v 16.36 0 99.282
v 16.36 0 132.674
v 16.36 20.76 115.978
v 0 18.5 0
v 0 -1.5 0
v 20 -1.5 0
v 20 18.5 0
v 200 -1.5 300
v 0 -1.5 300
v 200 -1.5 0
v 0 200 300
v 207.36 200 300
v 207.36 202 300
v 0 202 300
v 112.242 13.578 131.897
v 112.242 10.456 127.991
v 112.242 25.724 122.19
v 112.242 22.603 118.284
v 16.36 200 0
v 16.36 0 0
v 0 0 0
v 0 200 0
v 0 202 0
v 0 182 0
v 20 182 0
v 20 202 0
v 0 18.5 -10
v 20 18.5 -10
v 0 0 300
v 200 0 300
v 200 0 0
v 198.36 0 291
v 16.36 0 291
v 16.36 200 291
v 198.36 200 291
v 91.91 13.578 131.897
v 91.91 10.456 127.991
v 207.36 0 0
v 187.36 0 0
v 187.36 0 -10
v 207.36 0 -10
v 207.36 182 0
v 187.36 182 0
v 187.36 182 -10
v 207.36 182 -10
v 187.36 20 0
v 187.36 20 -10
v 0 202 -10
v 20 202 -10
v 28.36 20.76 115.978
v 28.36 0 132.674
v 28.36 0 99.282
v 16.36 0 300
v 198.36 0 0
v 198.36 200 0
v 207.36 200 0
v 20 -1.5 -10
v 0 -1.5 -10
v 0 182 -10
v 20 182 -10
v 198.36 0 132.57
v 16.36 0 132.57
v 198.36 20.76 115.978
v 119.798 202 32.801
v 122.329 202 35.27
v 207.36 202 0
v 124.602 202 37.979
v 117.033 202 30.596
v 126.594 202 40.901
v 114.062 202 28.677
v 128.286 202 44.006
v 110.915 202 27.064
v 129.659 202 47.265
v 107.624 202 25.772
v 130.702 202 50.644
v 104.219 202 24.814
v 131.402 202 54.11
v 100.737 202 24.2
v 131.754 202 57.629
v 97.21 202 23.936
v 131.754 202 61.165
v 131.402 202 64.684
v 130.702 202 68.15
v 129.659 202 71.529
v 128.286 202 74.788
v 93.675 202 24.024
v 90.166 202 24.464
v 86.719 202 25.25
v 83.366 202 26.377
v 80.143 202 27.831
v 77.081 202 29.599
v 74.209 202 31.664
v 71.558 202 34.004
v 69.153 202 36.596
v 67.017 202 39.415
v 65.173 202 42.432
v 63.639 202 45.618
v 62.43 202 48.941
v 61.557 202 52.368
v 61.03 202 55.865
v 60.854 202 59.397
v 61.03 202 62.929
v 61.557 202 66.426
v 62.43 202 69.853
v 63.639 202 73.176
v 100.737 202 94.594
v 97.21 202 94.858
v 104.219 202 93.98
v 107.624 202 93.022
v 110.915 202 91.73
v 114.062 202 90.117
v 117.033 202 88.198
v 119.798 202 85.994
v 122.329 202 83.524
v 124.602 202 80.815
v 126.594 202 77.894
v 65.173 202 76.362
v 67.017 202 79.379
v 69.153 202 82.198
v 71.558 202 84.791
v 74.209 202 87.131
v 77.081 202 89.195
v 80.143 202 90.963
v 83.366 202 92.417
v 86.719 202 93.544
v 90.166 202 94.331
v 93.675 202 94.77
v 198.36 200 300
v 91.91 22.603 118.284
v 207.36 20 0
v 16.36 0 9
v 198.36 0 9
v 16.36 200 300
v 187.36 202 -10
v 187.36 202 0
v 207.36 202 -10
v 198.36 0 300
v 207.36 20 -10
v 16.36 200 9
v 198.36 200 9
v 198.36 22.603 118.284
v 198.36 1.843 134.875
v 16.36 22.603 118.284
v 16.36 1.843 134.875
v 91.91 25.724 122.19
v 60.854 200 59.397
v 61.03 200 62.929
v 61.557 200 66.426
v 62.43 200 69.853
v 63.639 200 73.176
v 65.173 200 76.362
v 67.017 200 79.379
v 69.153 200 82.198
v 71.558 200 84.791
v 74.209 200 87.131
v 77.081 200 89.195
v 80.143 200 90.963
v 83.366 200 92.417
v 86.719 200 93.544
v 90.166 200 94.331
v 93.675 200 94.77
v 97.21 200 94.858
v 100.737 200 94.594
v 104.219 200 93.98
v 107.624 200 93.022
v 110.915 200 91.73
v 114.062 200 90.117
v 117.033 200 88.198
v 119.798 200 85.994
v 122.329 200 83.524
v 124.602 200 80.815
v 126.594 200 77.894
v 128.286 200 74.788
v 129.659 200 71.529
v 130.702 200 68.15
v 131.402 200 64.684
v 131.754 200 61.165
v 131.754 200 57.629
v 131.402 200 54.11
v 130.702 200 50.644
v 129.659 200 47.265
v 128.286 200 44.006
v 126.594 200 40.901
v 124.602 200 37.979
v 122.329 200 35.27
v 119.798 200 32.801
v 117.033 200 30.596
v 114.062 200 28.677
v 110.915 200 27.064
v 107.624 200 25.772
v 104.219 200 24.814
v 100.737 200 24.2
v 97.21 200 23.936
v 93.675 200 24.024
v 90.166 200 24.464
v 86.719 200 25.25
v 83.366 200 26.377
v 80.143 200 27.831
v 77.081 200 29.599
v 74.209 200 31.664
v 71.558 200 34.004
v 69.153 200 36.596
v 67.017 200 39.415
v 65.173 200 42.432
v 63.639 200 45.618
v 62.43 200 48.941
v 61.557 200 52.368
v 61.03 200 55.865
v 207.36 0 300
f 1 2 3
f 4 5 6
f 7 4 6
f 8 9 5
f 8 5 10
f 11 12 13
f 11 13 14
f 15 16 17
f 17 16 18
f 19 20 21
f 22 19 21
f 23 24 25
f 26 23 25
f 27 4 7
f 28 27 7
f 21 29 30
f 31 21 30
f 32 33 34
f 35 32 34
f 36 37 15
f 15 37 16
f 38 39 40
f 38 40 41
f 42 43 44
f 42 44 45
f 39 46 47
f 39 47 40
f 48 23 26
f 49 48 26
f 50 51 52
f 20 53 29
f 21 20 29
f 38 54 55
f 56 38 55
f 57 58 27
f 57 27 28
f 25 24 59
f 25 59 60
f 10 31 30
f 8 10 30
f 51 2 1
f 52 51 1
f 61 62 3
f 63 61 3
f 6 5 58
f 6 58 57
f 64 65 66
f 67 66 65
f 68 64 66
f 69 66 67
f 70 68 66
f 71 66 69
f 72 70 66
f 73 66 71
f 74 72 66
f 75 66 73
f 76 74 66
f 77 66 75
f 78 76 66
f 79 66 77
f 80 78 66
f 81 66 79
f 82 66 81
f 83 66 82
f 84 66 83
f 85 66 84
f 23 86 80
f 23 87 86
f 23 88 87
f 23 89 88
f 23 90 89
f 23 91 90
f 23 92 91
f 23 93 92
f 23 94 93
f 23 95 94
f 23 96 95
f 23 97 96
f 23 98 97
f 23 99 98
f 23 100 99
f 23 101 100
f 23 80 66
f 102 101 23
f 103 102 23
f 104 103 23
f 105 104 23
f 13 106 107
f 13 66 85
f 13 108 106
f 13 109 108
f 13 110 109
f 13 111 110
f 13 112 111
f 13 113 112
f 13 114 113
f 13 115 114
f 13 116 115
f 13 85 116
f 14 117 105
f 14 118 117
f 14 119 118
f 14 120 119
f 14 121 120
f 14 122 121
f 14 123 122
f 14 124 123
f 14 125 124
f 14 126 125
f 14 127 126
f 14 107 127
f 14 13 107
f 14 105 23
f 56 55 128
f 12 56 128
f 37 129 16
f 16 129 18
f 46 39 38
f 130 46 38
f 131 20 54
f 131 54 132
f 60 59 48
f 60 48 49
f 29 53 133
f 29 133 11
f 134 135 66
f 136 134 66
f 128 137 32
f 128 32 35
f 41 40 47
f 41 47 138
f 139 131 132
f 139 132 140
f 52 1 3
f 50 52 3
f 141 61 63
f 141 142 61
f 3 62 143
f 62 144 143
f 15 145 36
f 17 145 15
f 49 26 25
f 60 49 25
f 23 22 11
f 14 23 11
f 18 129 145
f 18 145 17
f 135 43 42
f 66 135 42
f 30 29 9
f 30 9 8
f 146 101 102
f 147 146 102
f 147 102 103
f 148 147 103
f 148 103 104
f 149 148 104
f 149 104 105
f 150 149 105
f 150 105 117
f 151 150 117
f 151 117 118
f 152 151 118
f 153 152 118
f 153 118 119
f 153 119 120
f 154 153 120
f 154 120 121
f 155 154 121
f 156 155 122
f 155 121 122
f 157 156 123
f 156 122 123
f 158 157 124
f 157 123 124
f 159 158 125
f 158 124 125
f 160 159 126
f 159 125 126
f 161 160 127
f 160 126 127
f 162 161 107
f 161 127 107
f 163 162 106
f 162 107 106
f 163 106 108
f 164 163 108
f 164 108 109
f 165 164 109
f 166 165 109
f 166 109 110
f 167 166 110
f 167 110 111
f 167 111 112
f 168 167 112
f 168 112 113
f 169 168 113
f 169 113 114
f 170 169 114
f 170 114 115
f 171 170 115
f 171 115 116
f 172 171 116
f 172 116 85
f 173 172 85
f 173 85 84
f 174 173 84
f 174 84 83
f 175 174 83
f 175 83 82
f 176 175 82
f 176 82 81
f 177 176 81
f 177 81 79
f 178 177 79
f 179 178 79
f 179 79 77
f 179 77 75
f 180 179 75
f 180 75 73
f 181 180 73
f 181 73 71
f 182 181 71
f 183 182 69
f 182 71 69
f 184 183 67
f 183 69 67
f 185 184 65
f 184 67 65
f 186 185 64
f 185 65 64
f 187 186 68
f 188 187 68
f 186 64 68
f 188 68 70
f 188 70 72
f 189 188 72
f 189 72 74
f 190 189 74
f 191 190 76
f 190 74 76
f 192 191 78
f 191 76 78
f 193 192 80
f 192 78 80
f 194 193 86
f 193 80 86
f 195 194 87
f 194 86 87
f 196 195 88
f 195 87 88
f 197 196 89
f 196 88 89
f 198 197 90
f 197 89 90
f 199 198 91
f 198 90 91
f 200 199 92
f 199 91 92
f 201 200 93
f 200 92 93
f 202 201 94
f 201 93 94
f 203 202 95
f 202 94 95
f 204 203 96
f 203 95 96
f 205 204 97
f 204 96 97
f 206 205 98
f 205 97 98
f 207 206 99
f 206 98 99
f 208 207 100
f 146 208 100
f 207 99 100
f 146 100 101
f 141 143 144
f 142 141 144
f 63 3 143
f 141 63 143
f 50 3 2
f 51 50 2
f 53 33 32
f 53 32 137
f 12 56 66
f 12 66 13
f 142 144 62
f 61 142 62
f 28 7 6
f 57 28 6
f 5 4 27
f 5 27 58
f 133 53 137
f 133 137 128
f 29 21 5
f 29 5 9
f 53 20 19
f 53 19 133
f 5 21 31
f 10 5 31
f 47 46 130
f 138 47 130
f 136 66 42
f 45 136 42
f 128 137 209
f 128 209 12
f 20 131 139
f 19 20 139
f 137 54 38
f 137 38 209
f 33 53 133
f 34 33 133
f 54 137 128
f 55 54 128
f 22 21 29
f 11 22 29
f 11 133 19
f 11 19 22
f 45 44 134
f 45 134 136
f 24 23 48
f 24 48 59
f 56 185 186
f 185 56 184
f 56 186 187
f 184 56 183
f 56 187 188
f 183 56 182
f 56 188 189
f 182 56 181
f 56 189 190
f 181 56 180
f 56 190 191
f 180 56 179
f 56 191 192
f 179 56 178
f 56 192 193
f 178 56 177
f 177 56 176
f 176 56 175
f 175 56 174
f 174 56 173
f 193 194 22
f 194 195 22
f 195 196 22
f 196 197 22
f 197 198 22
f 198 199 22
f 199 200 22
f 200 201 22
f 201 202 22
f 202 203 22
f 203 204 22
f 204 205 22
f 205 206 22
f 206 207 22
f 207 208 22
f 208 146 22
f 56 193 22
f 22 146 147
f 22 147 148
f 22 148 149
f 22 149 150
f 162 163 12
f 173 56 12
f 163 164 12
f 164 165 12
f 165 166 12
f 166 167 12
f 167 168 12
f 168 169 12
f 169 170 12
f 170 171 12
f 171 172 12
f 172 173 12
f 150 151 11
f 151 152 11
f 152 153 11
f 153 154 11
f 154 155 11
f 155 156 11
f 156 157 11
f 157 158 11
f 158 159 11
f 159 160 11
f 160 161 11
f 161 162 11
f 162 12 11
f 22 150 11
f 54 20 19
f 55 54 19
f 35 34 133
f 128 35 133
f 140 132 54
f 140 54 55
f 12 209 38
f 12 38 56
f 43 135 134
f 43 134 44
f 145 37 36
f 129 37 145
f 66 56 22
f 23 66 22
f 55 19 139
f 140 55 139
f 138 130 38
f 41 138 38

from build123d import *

# Parameters (mm, degrees)
F0_W      = 200
F0_H      = 300
F1_DEPTH  = 1.5
F2_W      = 16.3604896516
F2_H      = 300
F3_DEPTH  = 200
F5_DEPTH  = 12
F7_DEPTH  = 182
F8_W      = 20.3324407339
F8_H      = 15.5486247241
F9_DEPTH  = 5
F10_W     = 200
F10_H     = 9
F11_DEPTH = 182
F12_W     = 200
F12_H     = 9
F13_DEPTH = 182
F14_W     = 200
F14_H     = 300
F15_DEPTH = 9
F16_W     = 207.3604896516
F16_H     = 300
F17_DEPTH = 2
F18_R     = 35.4724219955
F19_DEPTH = 3
F20_W     = 20
F20_H     = 20
F21_DEPTH = 10
F22_W     = 20
F22_H     = 20
F23_DEPTH = 10
F24_W     = 20
F24_H     = 20
F25_DEPTH = 10
F26_W     = 20
F26_H     = 20
F27_DEPTH = 10


with BuildPart() as f1:
    # F0 (on Front) → F1 (new body)
    with BuildSketch(Plane.XZ):
        with Locations((100, 150)):
            Rectangle(F0_W, F0_H)
    extrude(amount=F1_DEPTH)


with BuildPart() as f3:
    # F2 (on face) → F3 (new body)
    with BuildSketch(Plane(origin=(0, 0, 0), x_dir=(-1, 0, 0), z_dir=(0, 1, 0))):
        with Locations((-8.1802448258, 150)):
            Rectangle(F2_W, F2_H)
    extrude(amount=F3_DEPTH)


with BuildPart() as f5:
    # F4 (on face) → F5 (new body)
    with BuildSketch(Plane.YZ.offset(16.3604896516)):
        Polygon((20.75971663, 115.9783601761), (0, 132.6744705439), (0, 99.2822498083), align=None)
    extrude(amount=F5_DEPTH)


with BuildPart() as f7:
    # F6 (on face) → F7 (new body)
    with BuildSketch(Plane.YZ.offset(16.3604896516)):
        Polygon((0, 132.5696110725), (20.75971663, 115.9783601761), (22.6025279975, 118.2841683415), (1.8428113675, 134.875419238), align=None)
    extrude(amount=F7_DEPTH)


with BuildPart() as f9:
    # F8 (on face) → F9 (new body)
    with BuildSketch(Plane(origin=(0, 66.4967558928, 83.2037209107), x_dir=(1, 0, 0), z_dir=(0, 0.6243158731, 0.7811719981))):
        with Locations((102.0758375525, -63.964534238)):
            Rectangle(F8_W, F8_H)
    extrude(amount=F9_DEPTH)


with BuildPart() as f11:
    # F10 (on face) → F11 (new body)
    with BuildSketch(Plane.YZ.offset(16.3604896516)):
        with Locations((100, 295.5)):
            Rectangle(F10_W, F10_H)
    extrude(amount=F11_DEPTH)


with BuildPart() as f13:
    # F12 (on face) → F13 (new body)
    with BuildSketch(Plane.YZ.offset(16.3604896516)):
        with Locations((100, 4.5)):
            Rectangle(F12_W, F12_H)
    extrude(amount=F13_DEPTH)


with BuildPart() as f15:
    # F14 (on face) → F15 (new body)
    with BuildSketch(Plane.YZ.offset(198.3604896516)):
        with Locations((100, 150)):
            Rectangle(F14_W, F14_H)
    extrude(amount=F15_DEPTH)


with BuildPart() as f17:
    # F16 (on face) → F17 (new body)
    with BuildSketch(Plane(origin=(0, 200, 0), x_dir=(-1, 0, 0), z_dir=(0, 1, 0))):
        with Locations((-103.6802448258, 150)):
            Rectangle(F16_W, F16_H)
    extrude(amount=F17_DEPTH)

    # F18 (on face) → F19 (cut)
    with BuildSketch(Plane(origin=(0, 202, 0), x_dir=(-1, 0, 0), z_dir=(0, 1, 0))):
        with Locations((-96.3260084391, 59.3970827758)):
            Circle(F18_R)
    extrude(amount=-F19_DEPTH, mode=Mode.SUBTRACT)


with BuildPart() as f21:
    # F20 (on face) → F21 (new body)
    with BuildSketch(Plane(origin=(0, 0, 0), x_dir=(1, 0, 0), z_dir=(0, 0, -1))):
        with Locations((10, -8.5)):
            Rectangle(F20_W, F20_H)
    extrude(amount=F21_DEPTH)


with BuildPart() as f23:
    # F22 (on face) → F23 (new body)
    with BuildSketch(Plane(origin=(0, 0, 0), x_dir=(1, 0, 0), z_dir=(0, 0, -1))):
        with Locations((197.3604896516, -10)):
            Rectangle(F22_W, F22_H)
    extrude(amount=F23_DEPTH)


with BuildPart() as f25:
    # F24 (on face) → F25 (new body)
    with BuildSketch(Plane(origin=(0, 0, 0), x_dir=(1, 0, 0), z_dir=(0, 0, -1))):
        with Locations((10, -192)):
            Rectangle(F24_W, F24_H)
    extrude(amount=F25_DEPTH)


with BuildPart() as f27:
    # F26 (on face) → F27 (new body)
    with BuildSketch(Plane(origin=(0, 0, 0), x_dir=(1, 0, 0), z_dir=(0, 0, -1))):
        with Locations((197.3604896516, -192)):
            Rectangle(F26_W, F26_H)
    extrude(amount=F27_DEPTH)


solid = Compound([f1.part, f3.part, f5.part, f7.part, f9.part, f11.part, f13.part, f15.part, f17.part, f21.part, f23.part, f25.part, f27.part])
